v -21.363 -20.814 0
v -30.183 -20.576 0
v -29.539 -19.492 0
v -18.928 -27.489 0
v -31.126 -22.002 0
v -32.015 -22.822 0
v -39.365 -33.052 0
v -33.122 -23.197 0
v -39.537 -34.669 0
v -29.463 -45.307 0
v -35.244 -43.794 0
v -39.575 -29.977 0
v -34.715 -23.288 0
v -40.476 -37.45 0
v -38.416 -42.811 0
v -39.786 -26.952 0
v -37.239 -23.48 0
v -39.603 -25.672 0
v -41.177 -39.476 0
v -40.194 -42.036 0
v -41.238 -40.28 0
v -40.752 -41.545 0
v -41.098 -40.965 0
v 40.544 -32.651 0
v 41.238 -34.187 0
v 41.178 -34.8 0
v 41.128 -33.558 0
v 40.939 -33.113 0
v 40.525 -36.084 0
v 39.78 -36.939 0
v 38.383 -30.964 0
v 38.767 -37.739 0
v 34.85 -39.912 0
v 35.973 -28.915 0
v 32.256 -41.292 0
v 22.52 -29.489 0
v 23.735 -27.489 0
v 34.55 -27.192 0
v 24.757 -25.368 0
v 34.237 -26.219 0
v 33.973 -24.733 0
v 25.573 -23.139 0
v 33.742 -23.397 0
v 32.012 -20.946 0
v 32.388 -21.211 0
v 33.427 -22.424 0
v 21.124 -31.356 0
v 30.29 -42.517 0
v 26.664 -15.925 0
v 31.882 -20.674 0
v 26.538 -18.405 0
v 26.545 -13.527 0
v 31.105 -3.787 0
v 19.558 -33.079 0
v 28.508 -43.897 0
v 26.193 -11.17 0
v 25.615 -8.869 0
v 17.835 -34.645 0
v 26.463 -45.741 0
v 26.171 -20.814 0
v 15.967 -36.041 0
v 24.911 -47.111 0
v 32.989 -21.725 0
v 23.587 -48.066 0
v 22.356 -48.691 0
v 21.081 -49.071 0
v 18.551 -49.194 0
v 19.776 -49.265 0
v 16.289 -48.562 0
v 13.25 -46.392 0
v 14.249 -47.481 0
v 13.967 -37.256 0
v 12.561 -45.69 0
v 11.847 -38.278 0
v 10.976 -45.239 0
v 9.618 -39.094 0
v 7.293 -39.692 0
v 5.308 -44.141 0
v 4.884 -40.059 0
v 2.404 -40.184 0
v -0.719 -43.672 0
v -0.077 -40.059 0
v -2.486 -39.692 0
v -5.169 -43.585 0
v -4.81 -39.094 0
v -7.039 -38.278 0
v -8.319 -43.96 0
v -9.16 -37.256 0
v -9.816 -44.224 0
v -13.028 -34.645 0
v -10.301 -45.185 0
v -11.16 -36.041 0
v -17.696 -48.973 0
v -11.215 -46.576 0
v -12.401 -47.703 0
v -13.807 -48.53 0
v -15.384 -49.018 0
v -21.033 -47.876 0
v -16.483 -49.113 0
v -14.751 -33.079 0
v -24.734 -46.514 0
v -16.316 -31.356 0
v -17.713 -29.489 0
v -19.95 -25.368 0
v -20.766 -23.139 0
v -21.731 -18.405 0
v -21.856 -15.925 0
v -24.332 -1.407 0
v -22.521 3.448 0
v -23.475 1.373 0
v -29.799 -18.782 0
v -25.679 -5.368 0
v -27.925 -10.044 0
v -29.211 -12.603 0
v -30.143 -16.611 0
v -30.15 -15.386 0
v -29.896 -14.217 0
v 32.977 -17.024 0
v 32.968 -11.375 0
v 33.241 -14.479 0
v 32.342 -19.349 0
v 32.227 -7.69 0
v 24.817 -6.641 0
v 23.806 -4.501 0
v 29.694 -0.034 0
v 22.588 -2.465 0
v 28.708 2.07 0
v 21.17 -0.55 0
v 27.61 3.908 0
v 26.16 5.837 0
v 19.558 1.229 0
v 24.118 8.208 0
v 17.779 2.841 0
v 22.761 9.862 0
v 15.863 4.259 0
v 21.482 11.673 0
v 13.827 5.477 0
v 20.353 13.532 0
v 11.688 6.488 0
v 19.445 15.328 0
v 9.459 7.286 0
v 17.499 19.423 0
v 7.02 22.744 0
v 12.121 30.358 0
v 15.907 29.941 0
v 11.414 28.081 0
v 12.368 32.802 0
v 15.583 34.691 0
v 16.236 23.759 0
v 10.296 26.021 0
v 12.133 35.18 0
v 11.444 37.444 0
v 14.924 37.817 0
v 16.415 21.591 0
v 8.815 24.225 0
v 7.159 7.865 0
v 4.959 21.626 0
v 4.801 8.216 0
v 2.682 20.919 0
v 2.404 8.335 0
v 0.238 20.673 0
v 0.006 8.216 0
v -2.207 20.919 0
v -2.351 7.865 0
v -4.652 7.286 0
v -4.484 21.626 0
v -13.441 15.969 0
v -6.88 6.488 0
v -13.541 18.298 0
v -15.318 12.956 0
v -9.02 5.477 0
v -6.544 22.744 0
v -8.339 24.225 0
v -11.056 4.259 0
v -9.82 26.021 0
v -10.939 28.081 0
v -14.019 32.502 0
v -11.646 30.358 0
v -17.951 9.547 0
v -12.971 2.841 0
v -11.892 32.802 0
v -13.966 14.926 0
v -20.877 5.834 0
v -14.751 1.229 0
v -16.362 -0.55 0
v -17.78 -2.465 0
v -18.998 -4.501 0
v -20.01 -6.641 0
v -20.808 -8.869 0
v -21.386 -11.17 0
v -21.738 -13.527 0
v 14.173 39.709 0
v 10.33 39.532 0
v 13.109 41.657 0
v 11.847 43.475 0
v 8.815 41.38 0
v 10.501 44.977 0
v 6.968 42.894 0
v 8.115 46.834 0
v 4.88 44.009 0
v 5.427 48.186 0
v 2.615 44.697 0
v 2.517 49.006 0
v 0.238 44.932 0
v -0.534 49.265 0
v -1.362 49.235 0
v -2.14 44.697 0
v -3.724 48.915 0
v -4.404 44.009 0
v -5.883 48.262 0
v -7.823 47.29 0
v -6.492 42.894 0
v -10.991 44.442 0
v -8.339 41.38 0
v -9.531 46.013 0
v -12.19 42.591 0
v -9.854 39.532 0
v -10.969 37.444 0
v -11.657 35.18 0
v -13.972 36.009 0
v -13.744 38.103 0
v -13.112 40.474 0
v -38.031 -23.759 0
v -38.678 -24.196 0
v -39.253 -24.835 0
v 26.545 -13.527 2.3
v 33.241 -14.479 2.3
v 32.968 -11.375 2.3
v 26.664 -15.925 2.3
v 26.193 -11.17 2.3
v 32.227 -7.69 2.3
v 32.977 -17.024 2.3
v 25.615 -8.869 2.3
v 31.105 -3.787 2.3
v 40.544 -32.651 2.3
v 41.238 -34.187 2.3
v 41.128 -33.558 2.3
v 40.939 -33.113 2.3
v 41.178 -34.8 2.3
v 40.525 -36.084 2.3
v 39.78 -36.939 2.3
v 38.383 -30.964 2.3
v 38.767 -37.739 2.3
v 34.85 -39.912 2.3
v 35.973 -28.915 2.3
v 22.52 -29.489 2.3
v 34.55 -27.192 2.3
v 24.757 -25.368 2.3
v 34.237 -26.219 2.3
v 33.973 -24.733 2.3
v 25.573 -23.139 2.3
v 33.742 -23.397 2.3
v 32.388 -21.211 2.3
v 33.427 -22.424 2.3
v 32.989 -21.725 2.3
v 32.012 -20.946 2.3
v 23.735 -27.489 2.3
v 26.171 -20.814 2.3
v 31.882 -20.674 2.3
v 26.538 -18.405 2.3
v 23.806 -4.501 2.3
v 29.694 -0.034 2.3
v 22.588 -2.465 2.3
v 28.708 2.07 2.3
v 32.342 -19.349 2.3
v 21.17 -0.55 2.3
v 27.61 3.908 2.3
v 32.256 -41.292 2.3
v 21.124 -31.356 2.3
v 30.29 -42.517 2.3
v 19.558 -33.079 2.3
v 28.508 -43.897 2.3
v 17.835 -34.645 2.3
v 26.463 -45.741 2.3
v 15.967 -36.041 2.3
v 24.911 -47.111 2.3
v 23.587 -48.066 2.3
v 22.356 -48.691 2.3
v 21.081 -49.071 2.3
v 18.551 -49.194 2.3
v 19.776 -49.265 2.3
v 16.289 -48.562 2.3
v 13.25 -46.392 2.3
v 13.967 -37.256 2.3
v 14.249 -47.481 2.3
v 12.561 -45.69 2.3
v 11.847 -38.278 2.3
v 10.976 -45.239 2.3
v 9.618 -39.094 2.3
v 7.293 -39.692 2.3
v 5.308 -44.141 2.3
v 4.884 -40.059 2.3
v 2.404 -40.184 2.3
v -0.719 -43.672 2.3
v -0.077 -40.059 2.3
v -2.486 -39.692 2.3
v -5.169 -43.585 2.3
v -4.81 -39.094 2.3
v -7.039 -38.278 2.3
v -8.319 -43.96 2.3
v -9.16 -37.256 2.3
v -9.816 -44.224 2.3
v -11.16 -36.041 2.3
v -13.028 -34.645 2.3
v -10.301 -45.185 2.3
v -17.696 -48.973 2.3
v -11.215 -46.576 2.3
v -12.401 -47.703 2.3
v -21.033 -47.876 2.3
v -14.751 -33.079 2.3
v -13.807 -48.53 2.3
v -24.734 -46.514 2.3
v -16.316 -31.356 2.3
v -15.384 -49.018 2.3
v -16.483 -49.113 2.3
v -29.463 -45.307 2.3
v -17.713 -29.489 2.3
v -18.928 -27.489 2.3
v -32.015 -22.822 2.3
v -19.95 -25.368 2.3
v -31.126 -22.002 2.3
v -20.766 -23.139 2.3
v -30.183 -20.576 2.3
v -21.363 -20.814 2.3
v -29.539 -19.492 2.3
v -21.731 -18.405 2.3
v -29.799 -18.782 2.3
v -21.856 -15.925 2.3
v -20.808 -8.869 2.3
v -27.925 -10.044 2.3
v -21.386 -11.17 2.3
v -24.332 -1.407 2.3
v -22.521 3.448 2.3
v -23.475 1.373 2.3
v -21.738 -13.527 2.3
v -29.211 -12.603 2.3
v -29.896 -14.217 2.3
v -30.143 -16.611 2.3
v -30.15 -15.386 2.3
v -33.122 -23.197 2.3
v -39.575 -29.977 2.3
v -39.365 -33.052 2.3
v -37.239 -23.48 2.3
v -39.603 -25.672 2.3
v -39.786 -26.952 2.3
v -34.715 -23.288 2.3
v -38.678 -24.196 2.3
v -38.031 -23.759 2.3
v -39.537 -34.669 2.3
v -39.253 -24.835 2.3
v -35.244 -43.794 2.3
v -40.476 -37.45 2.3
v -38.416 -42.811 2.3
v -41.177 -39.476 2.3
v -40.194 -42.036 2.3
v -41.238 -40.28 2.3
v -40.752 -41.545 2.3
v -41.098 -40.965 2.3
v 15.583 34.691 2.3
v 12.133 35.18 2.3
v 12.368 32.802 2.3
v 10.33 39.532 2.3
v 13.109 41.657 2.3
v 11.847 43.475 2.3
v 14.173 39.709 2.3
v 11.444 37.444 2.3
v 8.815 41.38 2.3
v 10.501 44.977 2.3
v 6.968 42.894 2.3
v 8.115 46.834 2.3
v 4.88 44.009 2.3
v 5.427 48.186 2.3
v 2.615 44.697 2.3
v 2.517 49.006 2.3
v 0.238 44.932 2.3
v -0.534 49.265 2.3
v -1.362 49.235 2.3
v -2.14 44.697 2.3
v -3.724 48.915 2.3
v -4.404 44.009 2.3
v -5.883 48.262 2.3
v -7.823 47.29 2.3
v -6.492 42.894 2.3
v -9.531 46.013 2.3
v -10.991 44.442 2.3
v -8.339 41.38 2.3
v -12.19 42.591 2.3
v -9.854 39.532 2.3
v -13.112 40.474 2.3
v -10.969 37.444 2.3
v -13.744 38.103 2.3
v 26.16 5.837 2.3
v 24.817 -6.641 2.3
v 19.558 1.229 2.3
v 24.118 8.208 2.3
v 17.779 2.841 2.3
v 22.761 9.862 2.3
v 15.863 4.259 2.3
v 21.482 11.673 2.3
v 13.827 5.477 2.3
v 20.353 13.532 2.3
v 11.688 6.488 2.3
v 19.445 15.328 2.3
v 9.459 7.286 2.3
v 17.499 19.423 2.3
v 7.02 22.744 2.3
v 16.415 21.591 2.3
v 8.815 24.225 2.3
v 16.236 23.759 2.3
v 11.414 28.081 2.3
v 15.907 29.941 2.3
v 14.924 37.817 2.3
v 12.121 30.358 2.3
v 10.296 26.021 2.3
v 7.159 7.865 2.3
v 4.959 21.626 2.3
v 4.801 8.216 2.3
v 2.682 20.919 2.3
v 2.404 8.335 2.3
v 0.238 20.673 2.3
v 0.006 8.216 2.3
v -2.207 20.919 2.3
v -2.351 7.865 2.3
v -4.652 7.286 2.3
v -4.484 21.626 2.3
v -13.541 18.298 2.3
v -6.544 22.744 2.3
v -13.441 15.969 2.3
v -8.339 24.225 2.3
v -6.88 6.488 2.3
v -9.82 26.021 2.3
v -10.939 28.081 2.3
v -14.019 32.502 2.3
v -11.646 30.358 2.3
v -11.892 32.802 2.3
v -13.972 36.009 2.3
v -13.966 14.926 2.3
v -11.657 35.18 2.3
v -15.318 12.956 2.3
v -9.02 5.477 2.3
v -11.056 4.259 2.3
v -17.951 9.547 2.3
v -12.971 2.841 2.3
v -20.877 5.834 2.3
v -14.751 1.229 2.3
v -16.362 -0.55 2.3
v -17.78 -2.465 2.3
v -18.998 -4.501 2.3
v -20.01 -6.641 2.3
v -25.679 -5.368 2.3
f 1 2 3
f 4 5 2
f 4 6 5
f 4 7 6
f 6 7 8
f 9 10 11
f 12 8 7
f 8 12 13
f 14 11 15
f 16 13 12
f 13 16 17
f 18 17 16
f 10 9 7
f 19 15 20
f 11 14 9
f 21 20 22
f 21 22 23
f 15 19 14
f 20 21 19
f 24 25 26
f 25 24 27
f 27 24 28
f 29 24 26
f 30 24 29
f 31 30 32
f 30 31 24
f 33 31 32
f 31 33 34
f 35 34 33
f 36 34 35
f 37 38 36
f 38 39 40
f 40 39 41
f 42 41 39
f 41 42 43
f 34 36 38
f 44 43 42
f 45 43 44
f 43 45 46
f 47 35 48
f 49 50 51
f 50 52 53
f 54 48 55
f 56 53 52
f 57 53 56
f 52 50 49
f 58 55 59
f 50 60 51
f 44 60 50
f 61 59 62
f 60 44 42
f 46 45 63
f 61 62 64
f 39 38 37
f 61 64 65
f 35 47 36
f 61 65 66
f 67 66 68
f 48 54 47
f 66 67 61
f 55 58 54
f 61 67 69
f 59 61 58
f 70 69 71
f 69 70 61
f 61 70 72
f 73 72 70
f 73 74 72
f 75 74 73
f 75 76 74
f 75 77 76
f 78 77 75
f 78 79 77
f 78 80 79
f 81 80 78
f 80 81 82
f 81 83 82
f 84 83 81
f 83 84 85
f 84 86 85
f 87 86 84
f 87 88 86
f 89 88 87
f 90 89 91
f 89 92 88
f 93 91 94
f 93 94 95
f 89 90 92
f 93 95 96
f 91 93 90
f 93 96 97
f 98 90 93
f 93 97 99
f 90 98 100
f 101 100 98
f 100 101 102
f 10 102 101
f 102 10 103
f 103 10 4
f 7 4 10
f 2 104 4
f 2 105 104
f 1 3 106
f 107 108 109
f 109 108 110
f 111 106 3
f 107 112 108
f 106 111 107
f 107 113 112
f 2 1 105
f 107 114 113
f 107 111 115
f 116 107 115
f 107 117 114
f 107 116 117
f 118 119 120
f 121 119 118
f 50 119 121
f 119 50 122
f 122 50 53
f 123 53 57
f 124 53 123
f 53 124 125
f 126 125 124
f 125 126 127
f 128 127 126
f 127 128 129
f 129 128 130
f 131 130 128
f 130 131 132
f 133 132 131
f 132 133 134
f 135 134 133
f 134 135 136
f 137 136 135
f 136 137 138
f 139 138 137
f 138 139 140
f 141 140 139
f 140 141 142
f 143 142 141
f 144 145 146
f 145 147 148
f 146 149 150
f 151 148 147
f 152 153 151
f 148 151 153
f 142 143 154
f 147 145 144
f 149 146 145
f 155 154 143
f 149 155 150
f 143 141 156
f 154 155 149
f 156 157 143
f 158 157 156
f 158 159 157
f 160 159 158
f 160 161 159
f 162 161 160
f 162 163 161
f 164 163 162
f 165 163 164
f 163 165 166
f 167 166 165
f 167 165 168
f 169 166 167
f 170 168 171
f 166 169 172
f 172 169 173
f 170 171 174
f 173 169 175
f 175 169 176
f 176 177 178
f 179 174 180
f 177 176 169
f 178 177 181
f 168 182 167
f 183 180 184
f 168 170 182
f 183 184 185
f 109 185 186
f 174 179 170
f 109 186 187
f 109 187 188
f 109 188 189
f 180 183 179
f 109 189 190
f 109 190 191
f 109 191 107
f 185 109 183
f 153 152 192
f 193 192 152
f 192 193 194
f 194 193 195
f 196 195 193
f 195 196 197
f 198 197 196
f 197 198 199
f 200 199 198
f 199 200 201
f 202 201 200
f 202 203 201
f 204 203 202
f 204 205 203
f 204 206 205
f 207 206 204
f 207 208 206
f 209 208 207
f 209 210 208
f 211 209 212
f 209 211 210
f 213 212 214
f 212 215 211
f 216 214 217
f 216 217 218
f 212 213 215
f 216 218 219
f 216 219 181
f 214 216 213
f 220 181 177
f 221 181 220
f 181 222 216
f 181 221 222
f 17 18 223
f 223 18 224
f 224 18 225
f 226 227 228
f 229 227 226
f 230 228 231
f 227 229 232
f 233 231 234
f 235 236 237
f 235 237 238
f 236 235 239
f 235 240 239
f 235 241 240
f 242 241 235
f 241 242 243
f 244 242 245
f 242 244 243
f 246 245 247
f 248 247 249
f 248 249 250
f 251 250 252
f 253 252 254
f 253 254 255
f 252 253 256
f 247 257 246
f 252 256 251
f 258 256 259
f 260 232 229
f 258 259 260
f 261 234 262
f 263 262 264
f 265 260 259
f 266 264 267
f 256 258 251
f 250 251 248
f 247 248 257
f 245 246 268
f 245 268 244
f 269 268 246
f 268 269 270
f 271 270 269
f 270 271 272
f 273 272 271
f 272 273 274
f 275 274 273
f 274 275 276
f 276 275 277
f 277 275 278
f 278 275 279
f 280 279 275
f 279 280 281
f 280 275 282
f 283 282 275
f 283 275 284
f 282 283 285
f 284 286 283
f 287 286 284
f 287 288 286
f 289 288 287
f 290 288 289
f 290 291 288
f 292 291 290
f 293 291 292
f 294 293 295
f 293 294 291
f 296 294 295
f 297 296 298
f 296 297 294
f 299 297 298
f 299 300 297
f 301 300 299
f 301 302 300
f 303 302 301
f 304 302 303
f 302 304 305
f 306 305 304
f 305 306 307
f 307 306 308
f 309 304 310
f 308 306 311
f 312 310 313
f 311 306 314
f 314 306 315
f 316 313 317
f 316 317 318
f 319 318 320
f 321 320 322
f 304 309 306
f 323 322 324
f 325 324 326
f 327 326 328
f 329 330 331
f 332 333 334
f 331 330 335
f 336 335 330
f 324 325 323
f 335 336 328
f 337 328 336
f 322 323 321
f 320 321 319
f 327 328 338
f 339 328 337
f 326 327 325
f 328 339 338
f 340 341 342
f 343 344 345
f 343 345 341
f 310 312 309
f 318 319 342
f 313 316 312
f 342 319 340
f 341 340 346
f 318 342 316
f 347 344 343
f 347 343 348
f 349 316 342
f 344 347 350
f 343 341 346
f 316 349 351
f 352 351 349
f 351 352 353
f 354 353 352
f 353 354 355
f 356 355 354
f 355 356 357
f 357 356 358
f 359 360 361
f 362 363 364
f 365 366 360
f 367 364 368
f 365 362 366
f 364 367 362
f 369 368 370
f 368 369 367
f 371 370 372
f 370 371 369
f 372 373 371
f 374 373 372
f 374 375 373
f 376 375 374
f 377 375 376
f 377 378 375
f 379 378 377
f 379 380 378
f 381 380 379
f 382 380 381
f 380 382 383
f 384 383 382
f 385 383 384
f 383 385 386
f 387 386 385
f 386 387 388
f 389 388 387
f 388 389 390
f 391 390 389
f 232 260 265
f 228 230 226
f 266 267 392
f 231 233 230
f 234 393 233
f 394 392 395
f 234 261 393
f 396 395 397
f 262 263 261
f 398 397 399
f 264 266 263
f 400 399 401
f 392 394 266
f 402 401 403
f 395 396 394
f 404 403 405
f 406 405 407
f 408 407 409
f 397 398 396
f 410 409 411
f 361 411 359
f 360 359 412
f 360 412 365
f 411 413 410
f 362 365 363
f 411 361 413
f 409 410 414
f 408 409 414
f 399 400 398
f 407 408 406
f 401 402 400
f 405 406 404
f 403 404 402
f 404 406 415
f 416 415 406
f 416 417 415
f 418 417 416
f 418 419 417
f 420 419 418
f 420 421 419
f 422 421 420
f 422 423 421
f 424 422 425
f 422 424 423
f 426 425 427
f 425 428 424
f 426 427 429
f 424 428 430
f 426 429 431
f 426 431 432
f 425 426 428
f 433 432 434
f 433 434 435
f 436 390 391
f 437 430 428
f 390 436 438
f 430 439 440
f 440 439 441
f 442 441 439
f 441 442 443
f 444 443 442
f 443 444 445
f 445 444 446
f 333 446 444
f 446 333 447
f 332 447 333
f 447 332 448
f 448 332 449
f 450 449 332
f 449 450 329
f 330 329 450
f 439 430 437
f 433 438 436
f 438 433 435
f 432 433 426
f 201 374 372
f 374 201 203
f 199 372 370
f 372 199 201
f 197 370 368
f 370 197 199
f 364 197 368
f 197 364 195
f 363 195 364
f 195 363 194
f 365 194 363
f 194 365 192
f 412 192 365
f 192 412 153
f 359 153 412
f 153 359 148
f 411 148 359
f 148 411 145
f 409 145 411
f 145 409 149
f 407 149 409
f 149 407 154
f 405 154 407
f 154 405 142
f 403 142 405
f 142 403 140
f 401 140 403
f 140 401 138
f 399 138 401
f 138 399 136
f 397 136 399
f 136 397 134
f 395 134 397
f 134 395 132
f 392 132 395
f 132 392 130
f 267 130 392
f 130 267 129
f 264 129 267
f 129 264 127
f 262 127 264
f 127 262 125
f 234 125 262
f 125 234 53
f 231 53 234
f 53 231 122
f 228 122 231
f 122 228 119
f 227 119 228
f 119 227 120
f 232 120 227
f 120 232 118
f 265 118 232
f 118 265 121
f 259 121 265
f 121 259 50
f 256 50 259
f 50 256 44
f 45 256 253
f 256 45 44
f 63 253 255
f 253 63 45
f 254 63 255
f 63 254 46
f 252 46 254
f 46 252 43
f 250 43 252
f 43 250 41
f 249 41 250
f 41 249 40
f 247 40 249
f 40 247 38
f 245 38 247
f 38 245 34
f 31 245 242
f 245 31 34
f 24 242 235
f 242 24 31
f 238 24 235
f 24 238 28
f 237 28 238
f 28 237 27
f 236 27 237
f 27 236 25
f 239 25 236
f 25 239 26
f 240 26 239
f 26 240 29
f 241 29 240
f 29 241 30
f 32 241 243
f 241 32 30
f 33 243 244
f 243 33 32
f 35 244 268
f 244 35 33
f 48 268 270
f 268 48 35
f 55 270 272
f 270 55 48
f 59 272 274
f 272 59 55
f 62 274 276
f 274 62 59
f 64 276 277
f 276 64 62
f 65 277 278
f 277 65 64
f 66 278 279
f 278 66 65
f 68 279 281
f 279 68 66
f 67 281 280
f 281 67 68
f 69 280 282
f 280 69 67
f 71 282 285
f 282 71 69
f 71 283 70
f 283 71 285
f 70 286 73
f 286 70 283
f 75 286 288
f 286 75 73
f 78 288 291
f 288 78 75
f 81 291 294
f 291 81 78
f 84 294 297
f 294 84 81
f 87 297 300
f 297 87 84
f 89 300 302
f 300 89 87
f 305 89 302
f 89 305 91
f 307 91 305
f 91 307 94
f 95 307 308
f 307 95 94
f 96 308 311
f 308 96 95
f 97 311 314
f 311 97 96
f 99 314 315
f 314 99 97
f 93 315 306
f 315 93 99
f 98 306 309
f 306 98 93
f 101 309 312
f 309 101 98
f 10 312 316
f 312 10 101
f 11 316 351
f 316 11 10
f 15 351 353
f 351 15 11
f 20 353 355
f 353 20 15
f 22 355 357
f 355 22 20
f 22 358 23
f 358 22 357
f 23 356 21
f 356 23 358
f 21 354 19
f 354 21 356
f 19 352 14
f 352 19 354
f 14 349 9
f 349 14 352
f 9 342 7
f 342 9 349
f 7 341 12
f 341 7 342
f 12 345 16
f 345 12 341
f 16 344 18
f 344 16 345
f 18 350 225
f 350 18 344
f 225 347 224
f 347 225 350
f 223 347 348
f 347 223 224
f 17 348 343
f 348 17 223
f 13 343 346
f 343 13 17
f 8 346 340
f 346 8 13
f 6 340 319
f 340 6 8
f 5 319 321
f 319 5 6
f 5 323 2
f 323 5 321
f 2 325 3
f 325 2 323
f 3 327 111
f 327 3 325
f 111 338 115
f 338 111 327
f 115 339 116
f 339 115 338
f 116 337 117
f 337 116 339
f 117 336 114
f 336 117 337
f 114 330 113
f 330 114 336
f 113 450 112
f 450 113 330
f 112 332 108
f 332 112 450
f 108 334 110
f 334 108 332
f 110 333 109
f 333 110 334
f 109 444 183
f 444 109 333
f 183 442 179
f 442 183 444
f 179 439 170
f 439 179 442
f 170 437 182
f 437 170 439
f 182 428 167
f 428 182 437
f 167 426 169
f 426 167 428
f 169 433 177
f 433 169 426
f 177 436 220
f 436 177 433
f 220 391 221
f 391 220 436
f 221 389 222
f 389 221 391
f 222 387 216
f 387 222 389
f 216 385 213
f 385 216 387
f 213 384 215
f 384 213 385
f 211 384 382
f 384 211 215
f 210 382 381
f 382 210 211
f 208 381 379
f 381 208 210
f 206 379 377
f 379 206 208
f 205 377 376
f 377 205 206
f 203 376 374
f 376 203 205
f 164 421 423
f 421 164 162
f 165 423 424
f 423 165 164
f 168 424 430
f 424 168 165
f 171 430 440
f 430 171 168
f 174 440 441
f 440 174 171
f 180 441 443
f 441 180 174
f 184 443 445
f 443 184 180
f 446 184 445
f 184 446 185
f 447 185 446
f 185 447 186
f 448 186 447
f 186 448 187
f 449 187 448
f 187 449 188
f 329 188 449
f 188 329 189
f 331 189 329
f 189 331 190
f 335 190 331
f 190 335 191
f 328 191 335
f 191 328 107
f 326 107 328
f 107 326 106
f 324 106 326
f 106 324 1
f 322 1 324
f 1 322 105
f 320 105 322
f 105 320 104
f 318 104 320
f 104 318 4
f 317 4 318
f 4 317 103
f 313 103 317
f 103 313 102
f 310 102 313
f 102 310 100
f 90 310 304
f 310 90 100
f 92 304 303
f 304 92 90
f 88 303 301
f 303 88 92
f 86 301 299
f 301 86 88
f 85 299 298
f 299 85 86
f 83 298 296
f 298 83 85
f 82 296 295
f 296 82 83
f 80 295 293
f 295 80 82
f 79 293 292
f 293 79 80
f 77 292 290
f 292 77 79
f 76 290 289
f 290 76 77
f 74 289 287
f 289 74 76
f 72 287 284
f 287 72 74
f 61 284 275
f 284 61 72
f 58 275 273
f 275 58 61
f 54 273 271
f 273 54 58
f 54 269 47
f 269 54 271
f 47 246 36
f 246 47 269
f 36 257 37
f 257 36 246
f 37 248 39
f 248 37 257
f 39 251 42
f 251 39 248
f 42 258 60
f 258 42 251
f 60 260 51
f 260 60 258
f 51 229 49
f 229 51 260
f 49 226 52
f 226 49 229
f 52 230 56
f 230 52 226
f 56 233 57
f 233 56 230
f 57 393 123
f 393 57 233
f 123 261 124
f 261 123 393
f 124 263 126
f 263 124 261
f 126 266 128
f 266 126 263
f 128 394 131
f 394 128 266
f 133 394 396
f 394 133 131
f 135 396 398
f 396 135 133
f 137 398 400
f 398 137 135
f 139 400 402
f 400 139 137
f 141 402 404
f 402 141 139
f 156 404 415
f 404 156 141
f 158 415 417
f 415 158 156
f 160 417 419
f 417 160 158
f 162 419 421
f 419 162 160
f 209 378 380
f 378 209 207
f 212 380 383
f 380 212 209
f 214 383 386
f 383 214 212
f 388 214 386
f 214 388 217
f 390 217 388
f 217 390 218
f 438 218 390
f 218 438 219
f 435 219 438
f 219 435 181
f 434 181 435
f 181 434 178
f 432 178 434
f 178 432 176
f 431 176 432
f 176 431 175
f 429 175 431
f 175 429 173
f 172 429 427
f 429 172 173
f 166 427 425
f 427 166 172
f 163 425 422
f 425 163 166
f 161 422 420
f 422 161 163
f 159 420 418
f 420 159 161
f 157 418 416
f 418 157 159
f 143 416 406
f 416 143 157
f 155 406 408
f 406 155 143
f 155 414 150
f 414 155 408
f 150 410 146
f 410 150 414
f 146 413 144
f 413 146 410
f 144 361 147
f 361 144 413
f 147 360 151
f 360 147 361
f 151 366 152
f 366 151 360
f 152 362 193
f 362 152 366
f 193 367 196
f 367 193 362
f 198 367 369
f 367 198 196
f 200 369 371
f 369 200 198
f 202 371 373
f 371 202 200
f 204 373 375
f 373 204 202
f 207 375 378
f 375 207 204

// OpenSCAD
// Generated by inkscape 0.92.5 (2060ec1f9f, 2020-04-08) + inkscape-paths2openscad 0.25
// Mon Aug 24 15:02:12 2020 from "spaghettii_tux_00.svg"

// Module names are of the form poly_<inkscape-path-id>().  As a result,
// you can associate a polygon in this OpenSCAD program with the corresponding
// SVG element in the Inkscape document by looking for the XML element with
// the attribute id="inkscape-path-id".

// fudge value is used to ensure that subtracted solids are a tad taller
// in the z dimension than the polygon being subtracted from.  This helps
// keep the resulting .stl file manifold.
fudge = 0.1;
zsize = 2.2999999523162842;
line_fn = 4;
min_line_width = 1.0;
line_width_scale = 1.0;
function min_line_mm(w) = max(min_line_width, w * line_width_scale) * 96/25.4;


path4534_0_center = [0.000000,0.000000];
path4534_0_points = [[-2.019065,-186.197937],[-5.146015,-186.086609],[-14.074737,-184.874485],[-22.233372,-182.407469],[-29.567162,-178.734809],[-36.021345,-173.905750],[-41.541161,-167.969538],[-46.071850,-160.975418],[-49.558651,-152.972636],[-51.946805,-144.010438],[-52.806699,-136.097488],[-52.984114,-122.840808],[-51.177265,-69.158874],[-50.802265,-60.354184],[-52.784695,-56.412784],[-57.893172,-48.965894],[-67.847191,-36.084654],[-78.903840,-22.051338],[-85.117637,-13.032511],[-88.725508,-5.188683],[-91.964379,5.319636],[-97.054045,20.288759],[-105.544457,37.960266],[-110.403676,47.634464],[-112.993846,53.732938],[-113.954535,58.150153],[-113.925316,62.780576],[-112.624535,70.987606],[-111.644066,73.669246],[-114.077660,77.766906],[-117.641041,83.157530],[-121.002770,86.255690],[-125.183682,87.672445],[-131.204613,88.018856],[-140.745609,88.745010],[-143.740486,89.795978],[-146.185082,91.450496],[-148.357858,93.863564],[-149.681175,97.028626],[-150.373103,101.867119],[-149.575707,113.300106],[-148.779923,124.922579],[-149.431175,131.032536],[-152.980004,141.544246],[-155.630318,149.202475],[-155.860983,152.240805],[-155.332835,154.827926],[-154.024011,157.020823],[-151.912648,158.876480],[-145.194847,161.804016],[-133.206566,165.518856],[-111.356957,171.237606],[-93.484183,175.802391],[-79.493676,180.950496],[-66.884217,185.093629],[-62.296708,185.622109],[-58.146019,185.264956],[-52.183949,183.420506],[-46.868619,180.296425],[-42.388766,176.035027],[-38.933125,170.778626],[-37.099145,167.145816],[-31.440945,166.147766],[-19.538254,164.729745],[-2.718285,165.057926],[20.061028,166.831214],[41.482885,170.981746],[47.474536,172.685584],[50.080545,175.341126],[53.855935,179.454406],[61.564510,183.541750],[70.113745,185.930966],[74.742254,186.197937],[79.676245,185.464176],[84.493722,184.030657],[89.147039,181.667214],[94.150409,178.055767],[100.018045,172.878236],[107.746927,165.908618],[114.483308,160.694018],[121.911372,156.064201],[131.715305,150.848936],[146.521066,142.636018],[150.348128,139.610826],[153.164525,136.380186],[155.634086,131.528613],[155.860983,129.209201],[155.445775,126.835266],[154.731298,125.153194],[153.236833,123.405434],[145.068825,117.030576],[135.961614,109.285505],[130.584445,102.772766],[129.398128,99.093582],[128.402805,93.479796],[127.527404,88.430622],[126.337150,84.752013],[124.681679,82.109170],[122.410625,80.167296],[120.988358,79.165706],[120.497423,78.136760],[122.238745,73.130186],[124.636534,64.341811],[125.635235,54.723936],[124.605328,42.993988],[121.801790,29.063921],[117.563900,14.314938],[112.230935,0.128236],[108.504117,-7.822115],[104.352676,-14.771992],[98.871323,-22.059353],[91.154765,-31.022154],[86.026011,-37.273194],[81.192418,-44.117856],[76.924958,-51.142694],[73.494605,-57.934264],[66.139135,-73.410824],[62.041485,-81.604184],[61.365695,-89.797547],[60.119605,-113.162782],[58.897829,-131.115534],[56.404765,-142.930360],[53.565615,-150.082789],[49.544520,-157.444686],[44.774836,-164.314556],[39.689915,-169.990906],[30.671573,-177.008560],[20.512328,-182.121295],[9.514631,-185.220594],[-2.019065,-186.197937],[-2.019065,-186.197937],[0.898905,-169.822938],[9.884726,-168.933891],[18.443301,-166.333150],[26.334131,-162.120331],[33.316721,-156.395051],[39.042000,-149.412461],[43.254818,-141.521630],[45.855559,-132.963056],[46.744605,-123.977235],[45.812848,-114.738027],[43.141270,-106.132640],[38.914215,-98.345411],[33.316031,-91.560680],[26.531061,-85.962784],[18.743654,-81.736060],[10.138153,-79.064848],[0.898905,-78.133484],[-8.340344,-79.064846],[-16.945846,-81.736058],[-24.733256,-85.962780],[-31.518227,-91.560677],[-37.116413,-98.345408],[-41.343469,-106.132637],[-44.015048,-114.738025],[-44.946805,-123.977235],[-44.057758,-132.963057],[-41.457017,-141.521633],[-37.244197,-149.412464],[-31.518917,-156.395055],[-24.536325,-162.120334],[-16.645493,-166.333153],[-8.086917,-168.933893],[0.898905,-169.822938],[0.898905,-169.822938],[9.084445,-31.502624],[18.147016,-31.053954],[27.056088,-29.724532],[35.751537,-27.539263],[44.173238,-24.523051],[52.261067,-20.700800],[59.954900,-16.097414],[67.194612,-10.737798],[73.920081,-4.646856],[80.011023,2.078611],[85.370640,9.318324],[89.974027,17.012156],[93.796279,25.099985],[96.812492,33.521685],[98.997762,42.217133],[100.327184,51.126205],[100.775855,60.188776],[100.302284,69.563546],[98.912683,78.667497],[96.653142,87.454544],[93.569747,95.878598],[89.708588,103.893572],[85.115750,111.453382],[79.837323,118.511938],[73.919395,125.023155],[67.408052,130.940945],[60.349384,136.219222],[52.789477,140.811898],[44.774420,144.672887],[36.350300,147.756103],[27.563206,150.015457],[18.459225,151.404864],[9.084445,151.878236],[-0.290334,151.404863],[-9.394314,150.015456],[-18.181408,147.756101],[-26.605527,144.672885],[-34.620583,140.811895],[-42.180489,136.219219],[-49.239157,130.940942],[-55.750499,125.023152],[-61.668427,118.511935],[-66.946853,111.453379],[-71.539690,103.893570],[-75.400850,95.878596],[-78.484244,87.454542],[-80.743785,78.667496],[-82.133385,69.563545],[-82.606957,60.188776],[-82.158286,51.126206],[-80.828863,42.217134],[-78.643594,33.521687],[-75.627381,25.099986],[-71.805129,17.012158],[-67.201744,9.318326],[-61.842127,2.078614],[-55.751185,-4.646853],[-49.025717,-10.737795],[-41.786005,-16.097412],[-34.092173,-20.700797],[-26.004345,-24.523049],[-17.582644,-27.539261],[-8.887197,-29.724531],[0.021875,-31.053953],[9.084445,-31.502624],[9.084445,-31.502624]];
path4534_0_paths = [[0,1,2,3,4,5,6,7,8,9,10,11,12,13,14,15,16,17,18,19,20,21,22,23,24,25,26,27,28,29,30,31,32,33,34,35,36,37,38,39,40,41,42,43,44,45,46,47,48,49,50,51,52,53,54,55,56,57,58,59,60,61,62,63,64,65,66,67,68,69,70,71,72,73,74,75,76,77,78,79,80,81,82,83,84,85,86,87,88,89,90,91,92,93,94,95,96,97,98,99,100,101,102,103,104,105,106,107,108,109,110,111,112,113,114,115,116,117,118,119,120,121,122,123,124,125,126,127,128,129,130],
				[131,132,133,134,135,136,137,138,139,140,141,142,143,144,145,146,147,148,149,150,151,152,153,154,155,156,157,158,159,160,161,162,163,164],
				[165,166,167,168,169,170,171,172,173,174,175,176,177,178,179,180,181,182,183,184,185,186,187,188,189,190,191,192,193,194,195,196,197,198,199,200,201,202,203,204,205,206,207,208,209,210,211,212,213,214,215,216,217,218,219,220,221,222,223,224,225,226,227,228,229,230]];
module poly_path4534(h, w, s, res=line_fn)
{
  scale([25.4/96, -25.4/96, 1]) union()
  {
    translate (path4534_0_center) linear_extrude(height=h, convexity=10, scale=0.01*s)
      translate (-path4534_0_center) polygon(path4534_0_points, path4534_0_paths);
  }
}

module filter_tri_stand_27(h)
{
  difference()
  {
    union()
    {
      translate ([0,0,0]) poly_path4534(h, min_line_mm(0.60692447), 100.0);
    }
    union()
    {
    }
  }
}

filter_tri_stand_27(zsize);
